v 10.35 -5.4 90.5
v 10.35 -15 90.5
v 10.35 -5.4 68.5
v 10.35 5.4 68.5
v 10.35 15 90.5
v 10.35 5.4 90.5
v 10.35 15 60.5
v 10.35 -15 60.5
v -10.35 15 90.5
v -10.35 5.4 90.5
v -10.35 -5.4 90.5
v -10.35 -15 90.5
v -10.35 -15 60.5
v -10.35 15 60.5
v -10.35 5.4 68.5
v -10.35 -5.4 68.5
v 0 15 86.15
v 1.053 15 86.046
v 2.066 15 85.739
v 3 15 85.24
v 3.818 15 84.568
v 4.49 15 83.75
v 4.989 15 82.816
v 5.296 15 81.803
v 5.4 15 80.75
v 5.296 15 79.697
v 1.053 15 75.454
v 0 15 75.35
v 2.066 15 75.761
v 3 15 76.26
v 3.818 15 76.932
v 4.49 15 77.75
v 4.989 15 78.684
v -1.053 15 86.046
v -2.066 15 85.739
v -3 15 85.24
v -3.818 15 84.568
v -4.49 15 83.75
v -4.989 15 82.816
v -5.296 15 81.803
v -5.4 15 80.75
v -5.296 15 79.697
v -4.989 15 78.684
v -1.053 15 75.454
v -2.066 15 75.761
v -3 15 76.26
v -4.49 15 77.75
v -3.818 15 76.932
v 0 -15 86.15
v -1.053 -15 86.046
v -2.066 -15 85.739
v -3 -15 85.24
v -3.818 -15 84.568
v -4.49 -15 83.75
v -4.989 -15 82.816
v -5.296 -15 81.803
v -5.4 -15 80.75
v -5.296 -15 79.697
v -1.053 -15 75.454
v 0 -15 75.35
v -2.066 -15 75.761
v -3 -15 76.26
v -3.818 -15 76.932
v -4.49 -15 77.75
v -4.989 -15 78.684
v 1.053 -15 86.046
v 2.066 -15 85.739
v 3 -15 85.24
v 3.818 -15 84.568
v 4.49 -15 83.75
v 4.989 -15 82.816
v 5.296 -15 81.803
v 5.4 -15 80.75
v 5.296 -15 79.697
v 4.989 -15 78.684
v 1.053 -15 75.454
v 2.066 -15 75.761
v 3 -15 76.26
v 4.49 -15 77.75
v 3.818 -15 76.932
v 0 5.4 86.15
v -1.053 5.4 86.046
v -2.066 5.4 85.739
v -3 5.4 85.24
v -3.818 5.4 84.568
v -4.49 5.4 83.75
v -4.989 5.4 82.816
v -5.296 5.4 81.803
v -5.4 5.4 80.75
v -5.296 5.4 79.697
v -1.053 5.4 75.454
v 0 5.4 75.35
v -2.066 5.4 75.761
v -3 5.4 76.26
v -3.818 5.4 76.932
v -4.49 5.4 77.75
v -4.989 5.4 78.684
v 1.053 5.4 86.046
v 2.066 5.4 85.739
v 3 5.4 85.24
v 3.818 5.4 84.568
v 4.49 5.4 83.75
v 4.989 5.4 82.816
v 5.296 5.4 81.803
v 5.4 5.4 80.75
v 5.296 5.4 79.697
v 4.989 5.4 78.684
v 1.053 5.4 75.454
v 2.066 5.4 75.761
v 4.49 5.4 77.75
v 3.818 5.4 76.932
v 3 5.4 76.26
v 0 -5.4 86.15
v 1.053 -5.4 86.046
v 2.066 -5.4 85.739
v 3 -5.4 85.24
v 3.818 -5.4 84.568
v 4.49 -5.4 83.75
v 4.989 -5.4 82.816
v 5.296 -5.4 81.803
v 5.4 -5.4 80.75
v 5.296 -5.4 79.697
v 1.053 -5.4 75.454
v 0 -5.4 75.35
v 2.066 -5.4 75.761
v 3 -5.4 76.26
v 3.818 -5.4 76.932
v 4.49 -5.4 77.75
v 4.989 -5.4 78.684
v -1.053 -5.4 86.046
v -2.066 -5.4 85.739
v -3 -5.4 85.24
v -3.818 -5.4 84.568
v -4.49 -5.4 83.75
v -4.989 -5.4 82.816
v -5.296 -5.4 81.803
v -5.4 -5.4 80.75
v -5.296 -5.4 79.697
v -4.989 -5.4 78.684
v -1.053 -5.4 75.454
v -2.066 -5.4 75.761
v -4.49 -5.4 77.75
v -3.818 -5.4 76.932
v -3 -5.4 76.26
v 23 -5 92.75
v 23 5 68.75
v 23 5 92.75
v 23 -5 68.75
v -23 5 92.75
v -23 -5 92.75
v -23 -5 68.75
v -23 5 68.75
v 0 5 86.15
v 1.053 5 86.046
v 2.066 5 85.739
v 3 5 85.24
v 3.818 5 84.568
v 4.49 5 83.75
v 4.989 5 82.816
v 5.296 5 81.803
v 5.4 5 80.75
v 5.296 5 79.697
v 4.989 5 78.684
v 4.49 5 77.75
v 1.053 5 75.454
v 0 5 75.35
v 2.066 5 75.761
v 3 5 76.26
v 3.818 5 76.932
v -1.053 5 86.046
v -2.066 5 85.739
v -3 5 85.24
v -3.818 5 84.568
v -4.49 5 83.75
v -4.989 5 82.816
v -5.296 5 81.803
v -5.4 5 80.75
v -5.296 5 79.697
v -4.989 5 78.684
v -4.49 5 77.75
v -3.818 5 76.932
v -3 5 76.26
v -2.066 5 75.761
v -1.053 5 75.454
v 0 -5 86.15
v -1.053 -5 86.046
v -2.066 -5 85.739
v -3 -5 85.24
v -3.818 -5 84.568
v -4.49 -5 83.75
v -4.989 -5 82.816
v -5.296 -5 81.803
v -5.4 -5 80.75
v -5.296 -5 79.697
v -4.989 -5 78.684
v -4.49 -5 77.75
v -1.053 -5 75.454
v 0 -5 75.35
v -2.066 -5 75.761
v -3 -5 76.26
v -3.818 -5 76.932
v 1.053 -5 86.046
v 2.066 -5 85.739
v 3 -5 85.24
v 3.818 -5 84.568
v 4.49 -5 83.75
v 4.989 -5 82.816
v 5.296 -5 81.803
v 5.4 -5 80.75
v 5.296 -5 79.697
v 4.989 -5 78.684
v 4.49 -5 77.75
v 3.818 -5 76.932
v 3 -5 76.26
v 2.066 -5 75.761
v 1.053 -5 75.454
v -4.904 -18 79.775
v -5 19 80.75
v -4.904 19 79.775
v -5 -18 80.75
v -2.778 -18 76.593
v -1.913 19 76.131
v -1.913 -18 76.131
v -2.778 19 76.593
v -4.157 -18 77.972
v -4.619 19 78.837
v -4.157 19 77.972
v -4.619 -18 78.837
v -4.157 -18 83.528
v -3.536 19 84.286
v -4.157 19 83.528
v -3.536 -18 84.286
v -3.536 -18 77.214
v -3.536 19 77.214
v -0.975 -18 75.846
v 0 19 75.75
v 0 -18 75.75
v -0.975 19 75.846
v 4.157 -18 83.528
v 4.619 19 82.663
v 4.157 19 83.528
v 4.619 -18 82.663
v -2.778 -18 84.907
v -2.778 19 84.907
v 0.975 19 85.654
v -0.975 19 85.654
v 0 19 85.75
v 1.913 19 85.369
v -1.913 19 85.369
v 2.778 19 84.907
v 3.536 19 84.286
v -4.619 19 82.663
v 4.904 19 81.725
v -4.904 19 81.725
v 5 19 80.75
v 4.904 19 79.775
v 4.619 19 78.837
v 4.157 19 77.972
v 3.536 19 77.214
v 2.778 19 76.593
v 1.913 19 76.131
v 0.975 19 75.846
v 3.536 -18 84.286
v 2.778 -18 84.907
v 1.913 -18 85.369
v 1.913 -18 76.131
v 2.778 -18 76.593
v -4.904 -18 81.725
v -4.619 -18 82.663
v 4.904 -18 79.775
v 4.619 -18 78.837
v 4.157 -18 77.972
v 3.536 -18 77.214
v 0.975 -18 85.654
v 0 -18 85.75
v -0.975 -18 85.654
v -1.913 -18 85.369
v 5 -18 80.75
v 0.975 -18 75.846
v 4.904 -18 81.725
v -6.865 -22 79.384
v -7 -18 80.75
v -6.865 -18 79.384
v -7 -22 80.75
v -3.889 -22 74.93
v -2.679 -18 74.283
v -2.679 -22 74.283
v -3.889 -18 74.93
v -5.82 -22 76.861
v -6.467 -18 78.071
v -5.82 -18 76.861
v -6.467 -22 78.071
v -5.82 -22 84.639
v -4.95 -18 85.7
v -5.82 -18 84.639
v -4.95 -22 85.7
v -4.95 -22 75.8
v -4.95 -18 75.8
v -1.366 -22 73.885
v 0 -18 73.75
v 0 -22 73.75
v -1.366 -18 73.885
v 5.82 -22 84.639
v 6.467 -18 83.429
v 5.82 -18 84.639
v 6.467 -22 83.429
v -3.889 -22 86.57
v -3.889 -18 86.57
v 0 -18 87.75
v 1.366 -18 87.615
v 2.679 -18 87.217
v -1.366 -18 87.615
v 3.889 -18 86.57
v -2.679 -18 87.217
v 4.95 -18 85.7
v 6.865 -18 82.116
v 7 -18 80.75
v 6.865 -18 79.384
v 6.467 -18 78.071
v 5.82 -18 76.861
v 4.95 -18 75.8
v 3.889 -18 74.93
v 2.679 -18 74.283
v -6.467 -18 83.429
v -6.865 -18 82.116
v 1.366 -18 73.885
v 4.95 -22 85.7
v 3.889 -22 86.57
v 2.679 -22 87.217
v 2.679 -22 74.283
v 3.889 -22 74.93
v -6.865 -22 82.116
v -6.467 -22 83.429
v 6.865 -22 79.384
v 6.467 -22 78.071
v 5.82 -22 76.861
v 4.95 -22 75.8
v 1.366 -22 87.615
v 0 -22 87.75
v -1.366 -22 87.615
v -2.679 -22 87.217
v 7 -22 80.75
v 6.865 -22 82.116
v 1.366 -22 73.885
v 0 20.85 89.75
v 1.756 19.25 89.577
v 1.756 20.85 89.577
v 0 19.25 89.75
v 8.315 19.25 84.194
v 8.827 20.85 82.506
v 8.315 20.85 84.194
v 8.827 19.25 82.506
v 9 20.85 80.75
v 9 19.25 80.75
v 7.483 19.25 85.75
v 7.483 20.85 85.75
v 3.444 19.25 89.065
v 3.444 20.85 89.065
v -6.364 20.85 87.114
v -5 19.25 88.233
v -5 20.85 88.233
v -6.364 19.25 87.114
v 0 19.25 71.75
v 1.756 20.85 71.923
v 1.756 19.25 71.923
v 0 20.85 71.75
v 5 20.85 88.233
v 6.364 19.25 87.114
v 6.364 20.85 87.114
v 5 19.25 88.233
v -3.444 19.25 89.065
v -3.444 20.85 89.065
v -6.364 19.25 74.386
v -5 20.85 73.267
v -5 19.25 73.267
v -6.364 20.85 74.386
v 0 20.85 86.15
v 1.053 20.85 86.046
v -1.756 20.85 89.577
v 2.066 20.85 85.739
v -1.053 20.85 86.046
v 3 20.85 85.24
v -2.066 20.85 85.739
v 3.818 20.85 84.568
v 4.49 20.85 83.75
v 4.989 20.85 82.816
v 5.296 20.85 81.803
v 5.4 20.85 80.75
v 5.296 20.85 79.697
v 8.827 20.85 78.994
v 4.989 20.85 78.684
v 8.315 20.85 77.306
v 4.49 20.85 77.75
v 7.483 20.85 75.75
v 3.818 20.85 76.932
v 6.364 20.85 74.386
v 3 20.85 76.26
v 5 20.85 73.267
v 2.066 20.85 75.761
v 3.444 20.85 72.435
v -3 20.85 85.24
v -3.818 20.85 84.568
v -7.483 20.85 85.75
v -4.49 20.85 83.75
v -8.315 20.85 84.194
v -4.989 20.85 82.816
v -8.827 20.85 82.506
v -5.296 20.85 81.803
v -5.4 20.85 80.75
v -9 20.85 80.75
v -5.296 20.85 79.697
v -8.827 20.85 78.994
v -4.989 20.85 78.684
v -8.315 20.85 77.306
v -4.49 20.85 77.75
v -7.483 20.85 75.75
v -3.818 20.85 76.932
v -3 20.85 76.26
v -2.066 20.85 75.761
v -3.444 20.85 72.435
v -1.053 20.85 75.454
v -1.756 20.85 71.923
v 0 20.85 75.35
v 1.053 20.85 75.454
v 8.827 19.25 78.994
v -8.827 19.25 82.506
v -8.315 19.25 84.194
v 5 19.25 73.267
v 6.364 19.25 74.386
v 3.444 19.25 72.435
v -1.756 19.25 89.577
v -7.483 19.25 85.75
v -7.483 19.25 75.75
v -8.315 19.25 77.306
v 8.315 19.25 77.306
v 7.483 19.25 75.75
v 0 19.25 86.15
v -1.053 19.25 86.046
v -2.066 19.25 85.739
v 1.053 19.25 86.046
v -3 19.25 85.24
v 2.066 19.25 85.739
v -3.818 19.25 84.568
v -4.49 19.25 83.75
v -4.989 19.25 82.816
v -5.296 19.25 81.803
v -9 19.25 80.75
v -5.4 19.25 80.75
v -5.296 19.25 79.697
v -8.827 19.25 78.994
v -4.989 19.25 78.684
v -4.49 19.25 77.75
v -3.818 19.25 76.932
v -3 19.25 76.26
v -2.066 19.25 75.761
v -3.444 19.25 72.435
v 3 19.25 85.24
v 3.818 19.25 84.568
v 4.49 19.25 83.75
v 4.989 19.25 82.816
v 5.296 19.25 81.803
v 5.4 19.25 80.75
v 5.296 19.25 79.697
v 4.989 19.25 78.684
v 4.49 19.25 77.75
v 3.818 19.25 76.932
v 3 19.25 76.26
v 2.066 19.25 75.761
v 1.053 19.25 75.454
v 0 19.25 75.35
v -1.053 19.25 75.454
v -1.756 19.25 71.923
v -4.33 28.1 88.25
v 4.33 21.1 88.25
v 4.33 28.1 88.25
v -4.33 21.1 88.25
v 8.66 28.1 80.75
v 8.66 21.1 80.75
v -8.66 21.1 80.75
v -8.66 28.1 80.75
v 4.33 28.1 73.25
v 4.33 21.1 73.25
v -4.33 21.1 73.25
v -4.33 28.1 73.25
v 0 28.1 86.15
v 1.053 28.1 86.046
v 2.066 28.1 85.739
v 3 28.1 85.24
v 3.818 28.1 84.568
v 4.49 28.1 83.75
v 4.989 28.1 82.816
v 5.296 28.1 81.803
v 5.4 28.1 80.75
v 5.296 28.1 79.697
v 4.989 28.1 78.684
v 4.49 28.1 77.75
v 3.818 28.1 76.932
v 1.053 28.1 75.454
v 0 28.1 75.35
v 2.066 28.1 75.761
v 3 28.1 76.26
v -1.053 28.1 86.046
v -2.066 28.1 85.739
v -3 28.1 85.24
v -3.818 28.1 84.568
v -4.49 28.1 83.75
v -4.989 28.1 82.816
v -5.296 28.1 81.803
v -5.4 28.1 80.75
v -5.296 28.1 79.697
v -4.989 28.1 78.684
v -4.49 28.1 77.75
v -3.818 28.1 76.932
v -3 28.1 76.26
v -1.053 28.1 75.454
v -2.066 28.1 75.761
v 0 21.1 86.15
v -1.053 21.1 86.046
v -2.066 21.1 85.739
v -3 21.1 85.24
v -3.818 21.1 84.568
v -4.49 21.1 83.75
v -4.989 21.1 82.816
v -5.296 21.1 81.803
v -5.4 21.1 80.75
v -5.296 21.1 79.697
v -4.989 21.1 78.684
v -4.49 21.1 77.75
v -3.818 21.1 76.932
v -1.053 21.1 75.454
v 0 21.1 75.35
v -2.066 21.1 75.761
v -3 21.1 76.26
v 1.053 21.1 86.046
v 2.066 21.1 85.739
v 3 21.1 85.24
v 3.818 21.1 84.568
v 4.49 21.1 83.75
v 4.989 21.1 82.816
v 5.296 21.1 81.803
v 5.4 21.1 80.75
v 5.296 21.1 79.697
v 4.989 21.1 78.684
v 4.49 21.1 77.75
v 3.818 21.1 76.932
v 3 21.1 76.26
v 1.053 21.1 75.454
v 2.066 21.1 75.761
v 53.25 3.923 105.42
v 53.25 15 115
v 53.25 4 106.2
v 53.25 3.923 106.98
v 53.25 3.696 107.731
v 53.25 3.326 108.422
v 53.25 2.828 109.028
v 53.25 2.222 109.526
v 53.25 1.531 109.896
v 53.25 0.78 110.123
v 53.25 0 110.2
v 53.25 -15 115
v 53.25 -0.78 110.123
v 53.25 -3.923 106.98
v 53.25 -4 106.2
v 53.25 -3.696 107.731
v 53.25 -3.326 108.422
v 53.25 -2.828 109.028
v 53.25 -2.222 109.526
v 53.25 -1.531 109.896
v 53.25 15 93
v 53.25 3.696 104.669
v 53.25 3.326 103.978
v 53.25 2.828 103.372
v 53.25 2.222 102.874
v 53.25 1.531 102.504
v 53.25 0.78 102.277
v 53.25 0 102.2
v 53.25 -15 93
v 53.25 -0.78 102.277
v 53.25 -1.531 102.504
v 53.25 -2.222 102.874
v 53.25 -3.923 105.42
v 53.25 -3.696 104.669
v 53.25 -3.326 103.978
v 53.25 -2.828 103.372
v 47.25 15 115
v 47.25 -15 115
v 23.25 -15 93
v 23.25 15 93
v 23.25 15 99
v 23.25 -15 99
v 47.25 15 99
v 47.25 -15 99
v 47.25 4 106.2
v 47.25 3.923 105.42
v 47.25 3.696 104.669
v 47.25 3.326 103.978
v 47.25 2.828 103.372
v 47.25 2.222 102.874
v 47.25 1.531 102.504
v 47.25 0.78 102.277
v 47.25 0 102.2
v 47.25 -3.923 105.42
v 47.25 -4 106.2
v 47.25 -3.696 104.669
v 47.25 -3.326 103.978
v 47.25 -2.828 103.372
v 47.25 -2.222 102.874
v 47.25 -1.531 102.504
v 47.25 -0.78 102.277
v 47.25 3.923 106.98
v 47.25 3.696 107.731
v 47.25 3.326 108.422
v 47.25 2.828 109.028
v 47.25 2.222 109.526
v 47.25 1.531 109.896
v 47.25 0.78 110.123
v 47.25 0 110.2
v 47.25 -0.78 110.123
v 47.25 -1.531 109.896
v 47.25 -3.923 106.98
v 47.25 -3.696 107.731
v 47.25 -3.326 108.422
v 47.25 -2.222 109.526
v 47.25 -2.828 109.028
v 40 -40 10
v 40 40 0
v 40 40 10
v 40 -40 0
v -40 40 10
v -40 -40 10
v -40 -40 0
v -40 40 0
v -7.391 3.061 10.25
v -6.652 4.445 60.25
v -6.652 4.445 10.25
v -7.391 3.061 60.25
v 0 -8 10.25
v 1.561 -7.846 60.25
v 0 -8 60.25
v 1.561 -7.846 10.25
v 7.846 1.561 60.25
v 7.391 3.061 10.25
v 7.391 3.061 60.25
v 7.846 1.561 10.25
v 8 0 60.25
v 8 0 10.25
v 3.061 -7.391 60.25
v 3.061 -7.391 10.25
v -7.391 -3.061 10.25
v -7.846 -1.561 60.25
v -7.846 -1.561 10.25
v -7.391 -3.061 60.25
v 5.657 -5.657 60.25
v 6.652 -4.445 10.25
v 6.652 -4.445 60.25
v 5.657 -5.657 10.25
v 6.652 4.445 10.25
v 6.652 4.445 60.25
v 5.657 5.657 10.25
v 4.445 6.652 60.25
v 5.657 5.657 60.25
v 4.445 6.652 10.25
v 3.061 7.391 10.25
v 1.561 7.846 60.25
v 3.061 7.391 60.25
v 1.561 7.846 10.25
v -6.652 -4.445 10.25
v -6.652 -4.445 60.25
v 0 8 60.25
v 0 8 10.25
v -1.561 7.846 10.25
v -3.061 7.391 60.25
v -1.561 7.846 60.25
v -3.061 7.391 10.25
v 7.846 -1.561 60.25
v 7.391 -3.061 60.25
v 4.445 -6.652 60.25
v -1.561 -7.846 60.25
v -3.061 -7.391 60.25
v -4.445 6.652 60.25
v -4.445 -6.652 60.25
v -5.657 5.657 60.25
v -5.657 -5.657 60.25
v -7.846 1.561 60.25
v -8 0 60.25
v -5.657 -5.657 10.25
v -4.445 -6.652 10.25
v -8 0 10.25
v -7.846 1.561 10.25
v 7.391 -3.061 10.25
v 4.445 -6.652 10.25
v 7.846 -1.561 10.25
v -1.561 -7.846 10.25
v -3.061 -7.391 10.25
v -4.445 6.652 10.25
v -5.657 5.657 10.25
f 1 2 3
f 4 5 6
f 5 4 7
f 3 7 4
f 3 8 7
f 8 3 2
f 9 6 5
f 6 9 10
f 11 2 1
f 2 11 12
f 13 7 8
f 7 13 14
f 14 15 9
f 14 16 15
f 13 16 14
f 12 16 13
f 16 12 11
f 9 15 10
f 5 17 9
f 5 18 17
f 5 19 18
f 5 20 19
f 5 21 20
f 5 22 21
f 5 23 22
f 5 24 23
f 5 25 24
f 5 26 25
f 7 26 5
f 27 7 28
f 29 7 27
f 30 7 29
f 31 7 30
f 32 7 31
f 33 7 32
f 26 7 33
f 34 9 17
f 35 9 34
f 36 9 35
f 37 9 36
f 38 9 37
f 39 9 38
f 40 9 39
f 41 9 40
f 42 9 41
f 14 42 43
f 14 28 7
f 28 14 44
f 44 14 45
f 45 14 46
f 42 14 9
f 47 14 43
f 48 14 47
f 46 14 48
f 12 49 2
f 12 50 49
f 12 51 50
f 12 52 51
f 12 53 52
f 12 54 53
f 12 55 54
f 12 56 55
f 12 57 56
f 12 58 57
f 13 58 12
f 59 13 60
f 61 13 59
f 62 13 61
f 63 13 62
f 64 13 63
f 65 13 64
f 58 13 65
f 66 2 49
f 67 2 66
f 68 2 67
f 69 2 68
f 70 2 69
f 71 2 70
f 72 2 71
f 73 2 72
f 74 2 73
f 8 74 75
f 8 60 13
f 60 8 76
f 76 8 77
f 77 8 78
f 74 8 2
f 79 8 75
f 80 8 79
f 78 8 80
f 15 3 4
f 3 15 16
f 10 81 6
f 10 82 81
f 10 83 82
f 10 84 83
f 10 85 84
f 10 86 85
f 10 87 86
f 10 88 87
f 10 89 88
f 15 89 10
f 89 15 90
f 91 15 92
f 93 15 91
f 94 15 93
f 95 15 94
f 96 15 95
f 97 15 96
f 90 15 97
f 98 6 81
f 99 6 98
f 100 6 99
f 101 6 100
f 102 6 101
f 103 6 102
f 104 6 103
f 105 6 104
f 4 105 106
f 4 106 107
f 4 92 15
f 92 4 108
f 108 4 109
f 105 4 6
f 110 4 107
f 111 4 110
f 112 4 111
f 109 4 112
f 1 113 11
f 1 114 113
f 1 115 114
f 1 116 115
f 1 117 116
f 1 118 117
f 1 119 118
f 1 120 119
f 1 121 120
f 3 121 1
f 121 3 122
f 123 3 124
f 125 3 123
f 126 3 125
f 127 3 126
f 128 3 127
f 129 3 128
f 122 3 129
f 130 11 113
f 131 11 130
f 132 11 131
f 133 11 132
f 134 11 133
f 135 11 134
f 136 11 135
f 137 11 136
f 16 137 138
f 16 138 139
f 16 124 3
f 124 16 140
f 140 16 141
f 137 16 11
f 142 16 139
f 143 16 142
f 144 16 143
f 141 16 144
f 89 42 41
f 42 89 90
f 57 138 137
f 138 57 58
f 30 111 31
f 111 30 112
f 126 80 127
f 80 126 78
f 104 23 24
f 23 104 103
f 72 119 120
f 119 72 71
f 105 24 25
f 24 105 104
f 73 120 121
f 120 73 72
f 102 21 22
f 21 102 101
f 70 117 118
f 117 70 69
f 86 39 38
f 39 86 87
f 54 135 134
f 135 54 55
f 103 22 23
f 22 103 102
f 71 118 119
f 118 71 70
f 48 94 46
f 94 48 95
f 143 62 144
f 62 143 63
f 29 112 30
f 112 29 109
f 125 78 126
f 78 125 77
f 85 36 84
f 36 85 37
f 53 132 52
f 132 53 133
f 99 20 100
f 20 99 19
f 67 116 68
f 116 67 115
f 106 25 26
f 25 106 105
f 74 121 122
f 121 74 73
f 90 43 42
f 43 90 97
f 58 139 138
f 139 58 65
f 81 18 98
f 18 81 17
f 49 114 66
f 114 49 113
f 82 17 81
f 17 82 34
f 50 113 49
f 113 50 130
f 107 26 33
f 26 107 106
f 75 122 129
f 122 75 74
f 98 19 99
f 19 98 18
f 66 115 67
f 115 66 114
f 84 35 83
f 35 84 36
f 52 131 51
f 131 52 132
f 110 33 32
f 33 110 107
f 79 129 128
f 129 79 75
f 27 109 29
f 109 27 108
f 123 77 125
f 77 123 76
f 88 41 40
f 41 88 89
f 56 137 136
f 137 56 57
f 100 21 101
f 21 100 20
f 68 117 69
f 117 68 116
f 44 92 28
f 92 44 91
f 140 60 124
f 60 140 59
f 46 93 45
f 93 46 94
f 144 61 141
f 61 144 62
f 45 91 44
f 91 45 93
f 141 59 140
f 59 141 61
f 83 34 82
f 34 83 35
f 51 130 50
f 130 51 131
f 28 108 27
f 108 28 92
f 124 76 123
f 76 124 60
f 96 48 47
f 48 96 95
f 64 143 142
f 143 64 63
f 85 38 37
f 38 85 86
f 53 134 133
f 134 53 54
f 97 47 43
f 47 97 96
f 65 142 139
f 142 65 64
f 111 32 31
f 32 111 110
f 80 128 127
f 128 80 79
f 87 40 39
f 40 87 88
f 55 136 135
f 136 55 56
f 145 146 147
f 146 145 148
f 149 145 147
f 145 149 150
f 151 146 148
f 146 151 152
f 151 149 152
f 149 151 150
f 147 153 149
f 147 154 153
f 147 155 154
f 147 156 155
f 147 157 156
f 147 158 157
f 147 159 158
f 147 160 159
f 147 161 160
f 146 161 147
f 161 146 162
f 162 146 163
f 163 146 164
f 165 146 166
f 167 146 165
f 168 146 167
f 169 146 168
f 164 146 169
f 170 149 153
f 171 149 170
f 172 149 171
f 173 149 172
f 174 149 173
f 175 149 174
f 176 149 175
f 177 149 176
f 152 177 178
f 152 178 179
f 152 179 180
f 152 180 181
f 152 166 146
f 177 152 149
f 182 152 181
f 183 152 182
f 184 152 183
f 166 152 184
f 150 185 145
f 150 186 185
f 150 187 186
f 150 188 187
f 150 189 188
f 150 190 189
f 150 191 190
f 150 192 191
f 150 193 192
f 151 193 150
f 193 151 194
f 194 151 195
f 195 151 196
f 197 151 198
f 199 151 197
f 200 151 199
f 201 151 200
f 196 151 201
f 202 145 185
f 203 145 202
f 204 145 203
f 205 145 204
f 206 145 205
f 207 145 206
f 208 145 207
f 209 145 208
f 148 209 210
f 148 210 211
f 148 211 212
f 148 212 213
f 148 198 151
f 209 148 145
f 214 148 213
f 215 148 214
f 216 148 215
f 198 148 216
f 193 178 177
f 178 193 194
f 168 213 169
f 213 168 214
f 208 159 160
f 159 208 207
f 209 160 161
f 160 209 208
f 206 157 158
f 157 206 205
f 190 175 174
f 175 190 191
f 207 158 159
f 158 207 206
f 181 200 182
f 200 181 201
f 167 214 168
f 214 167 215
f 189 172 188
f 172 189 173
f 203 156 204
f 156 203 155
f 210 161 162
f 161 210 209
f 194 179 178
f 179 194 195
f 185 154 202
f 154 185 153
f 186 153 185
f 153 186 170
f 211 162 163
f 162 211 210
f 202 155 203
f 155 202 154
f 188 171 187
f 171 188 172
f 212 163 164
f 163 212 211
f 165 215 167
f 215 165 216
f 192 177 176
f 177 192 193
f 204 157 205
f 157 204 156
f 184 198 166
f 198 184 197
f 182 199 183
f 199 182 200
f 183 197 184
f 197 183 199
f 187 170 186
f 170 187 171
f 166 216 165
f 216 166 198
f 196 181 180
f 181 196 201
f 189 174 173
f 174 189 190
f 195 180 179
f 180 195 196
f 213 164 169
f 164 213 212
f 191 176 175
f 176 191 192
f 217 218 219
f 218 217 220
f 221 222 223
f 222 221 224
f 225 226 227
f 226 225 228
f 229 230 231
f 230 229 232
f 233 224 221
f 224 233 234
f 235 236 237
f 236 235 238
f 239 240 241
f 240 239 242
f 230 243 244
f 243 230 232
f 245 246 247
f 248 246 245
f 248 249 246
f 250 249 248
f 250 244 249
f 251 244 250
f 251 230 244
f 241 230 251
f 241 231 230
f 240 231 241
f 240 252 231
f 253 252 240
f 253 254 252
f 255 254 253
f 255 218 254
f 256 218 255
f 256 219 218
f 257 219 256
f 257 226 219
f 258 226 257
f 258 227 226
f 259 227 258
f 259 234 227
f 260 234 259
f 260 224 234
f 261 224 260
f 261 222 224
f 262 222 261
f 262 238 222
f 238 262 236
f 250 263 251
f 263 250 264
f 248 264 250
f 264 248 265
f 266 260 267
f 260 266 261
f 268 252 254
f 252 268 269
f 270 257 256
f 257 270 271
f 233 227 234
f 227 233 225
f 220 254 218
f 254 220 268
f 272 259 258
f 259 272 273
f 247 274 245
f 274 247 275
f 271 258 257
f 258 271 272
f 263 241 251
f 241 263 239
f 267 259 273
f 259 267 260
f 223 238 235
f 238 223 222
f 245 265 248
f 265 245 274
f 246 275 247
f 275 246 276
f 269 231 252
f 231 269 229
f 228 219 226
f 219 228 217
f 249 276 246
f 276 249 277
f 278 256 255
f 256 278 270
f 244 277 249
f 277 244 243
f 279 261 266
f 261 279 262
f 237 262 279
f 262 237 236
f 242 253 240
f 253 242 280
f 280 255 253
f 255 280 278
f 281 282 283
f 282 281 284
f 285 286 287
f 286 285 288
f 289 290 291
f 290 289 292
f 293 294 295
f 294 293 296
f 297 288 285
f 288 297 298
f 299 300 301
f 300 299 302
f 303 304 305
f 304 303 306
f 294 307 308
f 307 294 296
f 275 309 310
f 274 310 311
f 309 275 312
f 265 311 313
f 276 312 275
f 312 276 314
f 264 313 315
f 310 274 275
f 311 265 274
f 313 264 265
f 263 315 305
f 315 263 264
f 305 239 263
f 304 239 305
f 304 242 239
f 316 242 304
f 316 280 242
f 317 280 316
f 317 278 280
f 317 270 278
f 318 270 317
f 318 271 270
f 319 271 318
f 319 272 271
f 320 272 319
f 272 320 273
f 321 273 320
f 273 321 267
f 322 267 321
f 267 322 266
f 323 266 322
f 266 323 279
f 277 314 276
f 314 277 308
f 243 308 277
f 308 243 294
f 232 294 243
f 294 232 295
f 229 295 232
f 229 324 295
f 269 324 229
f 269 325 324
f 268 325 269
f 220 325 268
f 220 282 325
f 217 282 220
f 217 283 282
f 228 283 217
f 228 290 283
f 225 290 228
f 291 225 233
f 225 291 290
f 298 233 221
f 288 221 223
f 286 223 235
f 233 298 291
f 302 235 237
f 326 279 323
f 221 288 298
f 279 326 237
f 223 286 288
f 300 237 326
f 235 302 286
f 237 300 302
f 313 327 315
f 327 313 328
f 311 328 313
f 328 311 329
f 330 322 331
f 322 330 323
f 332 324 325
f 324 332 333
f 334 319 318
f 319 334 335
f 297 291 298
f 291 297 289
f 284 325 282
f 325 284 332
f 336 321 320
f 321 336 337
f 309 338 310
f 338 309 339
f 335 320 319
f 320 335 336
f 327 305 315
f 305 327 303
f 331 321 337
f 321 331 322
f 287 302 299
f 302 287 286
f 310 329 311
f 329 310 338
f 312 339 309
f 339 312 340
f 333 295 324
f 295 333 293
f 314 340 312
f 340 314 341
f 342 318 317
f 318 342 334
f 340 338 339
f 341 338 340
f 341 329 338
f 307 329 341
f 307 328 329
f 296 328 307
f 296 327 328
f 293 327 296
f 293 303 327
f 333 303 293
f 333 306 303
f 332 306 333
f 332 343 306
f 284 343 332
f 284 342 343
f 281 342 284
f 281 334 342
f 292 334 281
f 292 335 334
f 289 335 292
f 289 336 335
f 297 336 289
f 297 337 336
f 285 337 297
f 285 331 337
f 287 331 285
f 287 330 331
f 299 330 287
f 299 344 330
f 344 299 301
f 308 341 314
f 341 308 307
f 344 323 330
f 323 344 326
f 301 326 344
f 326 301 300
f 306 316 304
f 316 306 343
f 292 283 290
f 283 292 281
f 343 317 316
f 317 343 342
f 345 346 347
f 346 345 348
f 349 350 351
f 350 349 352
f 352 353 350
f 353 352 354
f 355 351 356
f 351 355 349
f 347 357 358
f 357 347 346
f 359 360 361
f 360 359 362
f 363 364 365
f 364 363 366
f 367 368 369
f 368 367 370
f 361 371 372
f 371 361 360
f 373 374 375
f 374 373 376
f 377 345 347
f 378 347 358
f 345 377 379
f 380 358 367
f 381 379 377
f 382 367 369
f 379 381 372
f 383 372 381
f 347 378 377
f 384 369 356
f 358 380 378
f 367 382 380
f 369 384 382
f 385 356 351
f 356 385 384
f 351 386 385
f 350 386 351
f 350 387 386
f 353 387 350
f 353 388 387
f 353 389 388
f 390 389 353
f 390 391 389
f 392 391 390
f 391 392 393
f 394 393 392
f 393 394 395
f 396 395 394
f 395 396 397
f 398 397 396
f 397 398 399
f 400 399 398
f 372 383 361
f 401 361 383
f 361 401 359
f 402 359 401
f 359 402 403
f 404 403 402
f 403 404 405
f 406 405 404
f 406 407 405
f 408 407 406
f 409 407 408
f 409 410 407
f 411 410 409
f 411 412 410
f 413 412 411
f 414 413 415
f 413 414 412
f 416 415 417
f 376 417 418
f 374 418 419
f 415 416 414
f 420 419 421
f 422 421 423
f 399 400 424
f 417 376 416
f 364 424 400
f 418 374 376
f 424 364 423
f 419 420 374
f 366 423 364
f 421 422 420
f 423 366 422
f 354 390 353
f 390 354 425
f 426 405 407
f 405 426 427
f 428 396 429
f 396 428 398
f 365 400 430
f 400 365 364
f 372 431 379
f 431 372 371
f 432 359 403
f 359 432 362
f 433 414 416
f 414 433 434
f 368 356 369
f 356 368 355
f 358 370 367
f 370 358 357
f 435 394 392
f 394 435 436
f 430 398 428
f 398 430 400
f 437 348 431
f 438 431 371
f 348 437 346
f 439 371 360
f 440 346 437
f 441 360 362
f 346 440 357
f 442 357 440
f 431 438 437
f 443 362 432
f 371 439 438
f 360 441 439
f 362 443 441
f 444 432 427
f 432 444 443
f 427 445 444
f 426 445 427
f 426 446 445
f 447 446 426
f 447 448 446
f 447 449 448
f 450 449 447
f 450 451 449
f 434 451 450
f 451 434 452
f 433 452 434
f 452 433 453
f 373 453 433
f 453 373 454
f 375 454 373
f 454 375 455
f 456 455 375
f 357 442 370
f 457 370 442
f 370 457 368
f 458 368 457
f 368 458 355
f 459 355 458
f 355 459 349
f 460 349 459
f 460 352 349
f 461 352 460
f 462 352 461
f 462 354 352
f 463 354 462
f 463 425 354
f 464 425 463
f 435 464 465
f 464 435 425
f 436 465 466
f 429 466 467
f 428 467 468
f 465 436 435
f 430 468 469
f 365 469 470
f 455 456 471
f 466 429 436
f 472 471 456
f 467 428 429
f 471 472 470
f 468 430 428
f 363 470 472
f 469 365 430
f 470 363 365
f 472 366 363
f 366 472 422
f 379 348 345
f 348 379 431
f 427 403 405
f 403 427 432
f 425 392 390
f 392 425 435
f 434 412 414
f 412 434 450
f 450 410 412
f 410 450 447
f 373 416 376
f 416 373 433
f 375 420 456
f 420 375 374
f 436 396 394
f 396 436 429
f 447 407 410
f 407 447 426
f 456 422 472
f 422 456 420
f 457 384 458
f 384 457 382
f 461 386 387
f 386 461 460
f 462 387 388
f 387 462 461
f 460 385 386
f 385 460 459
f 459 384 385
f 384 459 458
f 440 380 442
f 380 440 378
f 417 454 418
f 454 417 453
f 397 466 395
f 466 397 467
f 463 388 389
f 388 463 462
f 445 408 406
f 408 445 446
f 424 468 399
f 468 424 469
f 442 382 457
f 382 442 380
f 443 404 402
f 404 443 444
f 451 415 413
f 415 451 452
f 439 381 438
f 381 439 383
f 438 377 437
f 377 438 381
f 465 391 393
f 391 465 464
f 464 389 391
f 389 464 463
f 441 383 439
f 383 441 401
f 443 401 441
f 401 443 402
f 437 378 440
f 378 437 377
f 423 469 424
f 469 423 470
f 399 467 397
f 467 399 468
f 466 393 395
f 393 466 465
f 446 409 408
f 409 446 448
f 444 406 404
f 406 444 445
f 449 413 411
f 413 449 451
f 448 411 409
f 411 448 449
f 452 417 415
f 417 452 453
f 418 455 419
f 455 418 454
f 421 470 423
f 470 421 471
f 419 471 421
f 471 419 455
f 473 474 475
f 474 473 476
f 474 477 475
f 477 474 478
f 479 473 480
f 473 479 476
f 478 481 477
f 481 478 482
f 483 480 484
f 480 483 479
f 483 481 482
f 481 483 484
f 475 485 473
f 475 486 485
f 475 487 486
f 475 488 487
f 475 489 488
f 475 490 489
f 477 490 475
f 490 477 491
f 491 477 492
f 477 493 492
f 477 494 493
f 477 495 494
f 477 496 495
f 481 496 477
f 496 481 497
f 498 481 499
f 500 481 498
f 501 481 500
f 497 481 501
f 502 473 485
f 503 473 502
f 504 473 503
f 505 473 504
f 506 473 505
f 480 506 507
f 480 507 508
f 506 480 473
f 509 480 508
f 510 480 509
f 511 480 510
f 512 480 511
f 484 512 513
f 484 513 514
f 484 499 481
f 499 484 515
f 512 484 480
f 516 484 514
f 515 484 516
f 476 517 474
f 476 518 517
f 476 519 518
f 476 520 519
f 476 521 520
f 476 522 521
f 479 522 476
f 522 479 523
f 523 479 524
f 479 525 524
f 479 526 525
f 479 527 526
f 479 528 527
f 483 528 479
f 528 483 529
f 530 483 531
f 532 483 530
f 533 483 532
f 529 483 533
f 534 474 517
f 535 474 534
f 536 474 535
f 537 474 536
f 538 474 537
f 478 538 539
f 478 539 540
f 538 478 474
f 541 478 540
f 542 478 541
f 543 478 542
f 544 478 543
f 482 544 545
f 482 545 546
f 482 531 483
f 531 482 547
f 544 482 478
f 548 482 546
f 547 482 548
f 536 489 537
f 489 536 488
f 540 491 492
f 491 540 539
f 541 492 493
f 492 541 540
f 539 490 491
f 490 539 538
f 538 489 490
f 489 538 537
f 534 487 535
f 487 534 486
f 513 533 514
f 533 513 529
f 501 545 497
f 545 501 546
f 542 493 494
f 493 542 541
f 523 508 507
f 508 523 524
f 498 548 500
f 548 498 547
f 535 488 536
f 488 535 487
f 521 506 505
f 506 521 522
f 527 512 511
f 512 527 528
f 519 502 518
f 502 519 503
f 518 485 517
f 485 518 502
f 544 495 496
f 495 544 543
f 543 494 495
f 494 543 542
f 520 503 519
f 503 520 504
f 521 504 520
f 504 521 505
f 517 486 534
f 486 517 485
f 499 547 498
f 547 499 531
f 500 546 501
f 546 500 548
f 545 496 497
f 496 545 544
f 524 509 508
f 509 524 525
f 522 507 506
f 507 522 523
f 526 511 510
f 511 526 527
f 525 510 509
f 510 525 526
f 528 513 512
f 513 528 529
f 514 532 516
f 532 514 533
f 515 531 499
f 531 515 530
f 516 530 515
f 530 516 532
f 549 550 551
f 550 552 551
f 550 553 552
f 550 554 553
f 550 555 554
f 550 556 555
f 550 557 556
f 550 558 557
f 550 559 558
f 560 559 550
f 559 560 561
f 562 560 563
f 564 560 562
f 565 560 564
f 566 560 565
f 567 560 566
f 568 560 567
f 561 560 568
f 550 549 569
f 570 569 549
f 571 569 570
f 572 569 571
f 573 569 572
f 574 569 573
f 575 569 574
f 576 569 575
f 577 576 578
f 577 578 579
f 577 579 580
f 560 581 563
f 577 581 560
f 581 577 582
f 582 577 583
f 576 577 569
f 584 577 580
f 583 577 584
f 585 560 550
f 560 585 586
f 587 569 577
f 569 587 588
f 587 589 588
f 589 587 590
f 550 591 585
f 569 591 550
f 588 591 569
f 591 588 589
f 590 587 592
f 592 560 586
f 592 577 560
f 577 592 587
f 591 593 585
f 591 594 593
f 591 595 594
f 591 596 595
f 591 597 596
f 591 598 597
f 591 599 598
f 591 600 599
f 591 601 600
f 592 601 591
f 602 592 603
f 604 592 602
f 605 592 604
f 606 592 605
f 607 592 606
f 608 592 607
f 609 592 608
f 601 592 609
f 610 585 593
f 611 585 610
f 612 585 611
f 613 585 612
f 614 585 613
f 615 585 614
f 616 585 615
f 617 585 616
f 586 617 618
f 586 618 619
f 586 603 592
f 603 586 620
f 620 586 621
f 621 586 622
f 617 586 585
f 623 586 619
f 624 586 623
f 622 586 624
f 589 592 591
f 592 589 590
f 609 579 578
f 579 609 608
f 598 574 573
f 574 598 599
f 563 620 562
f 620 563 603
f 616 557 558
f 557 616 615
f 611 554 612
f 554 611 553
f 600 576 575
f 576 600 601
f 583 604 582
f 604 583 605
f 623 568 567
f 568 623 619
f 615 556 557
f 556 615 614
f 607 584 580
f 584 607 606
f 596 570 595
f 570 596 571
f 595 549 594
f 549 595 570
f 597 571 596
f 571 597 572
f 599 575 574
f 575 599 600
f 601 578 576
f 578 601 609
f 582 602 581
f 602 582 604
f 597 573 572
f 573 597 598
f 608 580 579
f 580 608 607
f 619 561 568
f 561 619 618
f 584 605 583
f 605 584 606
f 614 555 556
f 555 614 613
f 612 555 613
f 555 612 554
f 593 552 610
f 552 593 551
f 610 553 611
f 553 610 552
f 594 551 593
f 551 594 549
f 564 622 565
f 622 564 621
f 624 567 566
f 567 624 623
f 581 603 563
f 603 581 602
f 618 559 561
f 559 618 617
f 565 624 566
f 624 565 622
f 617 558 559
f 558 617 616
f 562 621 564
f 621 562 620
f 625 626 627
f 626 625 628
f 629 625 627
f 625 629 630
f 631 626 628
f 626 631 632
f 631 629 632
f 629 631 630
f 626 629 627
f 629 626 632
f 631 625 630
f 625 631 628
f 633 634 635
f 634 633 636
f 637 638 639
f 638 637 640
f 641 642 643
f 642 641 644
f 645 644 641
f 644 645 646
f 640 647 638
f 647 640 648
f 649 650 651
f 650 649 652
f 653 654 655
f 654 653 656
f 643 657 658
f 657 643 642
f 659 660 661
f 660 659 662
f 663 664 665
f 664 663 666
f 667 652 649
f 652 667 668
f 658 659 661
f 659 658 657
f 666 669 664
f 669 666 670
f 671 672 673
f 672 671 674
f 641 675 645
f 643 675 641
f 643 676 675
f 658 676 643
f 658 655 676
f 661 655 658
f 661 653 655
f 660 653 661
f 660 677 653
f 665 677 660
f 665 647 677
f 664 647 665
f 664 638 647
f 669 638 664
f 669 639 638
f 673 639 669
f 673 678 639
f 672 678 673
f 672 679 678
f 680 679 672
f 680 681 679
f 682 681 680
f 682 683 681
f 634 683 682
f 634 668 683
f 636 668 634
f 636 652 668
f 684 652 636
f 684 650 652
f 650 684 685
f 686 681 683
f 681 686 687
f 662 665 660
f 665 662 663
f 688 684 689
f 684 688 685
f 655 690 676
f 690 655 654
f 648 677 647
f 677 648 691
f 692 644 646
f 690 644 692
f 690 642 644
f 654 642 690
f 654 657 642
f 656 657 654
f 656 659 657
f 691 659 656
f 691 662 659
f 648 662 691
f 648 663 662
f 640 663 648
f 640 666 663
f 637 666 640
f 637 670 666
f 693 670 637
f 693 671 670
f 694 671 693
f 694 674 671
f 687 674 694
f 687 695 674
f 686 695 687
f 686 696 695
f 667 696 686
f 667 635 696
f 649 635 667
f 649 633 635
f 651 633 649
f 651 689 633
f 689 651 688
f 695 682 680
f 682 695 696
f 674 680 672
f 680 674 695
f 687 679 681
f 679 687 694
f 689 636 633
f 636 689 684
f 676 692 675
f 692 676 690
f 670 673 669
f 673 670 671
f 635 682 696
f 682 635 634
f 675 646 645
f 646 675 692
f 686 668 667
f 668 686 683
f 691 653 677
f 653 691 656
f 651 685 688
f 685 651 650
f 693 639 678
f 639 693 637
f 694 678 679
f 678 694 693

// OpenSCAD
$fn = 32;

// ------------------------------------------------------------------------
// Lamp arm: column d16 x 50 mm, arm 46 mm
// Every part is its own module, assembly() places every instance.
// ------------------------------------------------------------------------

// --- part 1 ---
module lamp_base() {
  difference() {
    translate([-40, -40, 0]) cube([80, 80, 10]);
  }
}

// --- part 2 ---
module lamp_column() {
  cylinder(h = 50, d = 16);
}

// --- part 3 ---
module head_fork() {
  difference() {
    translate([-10.35, -15, 0]) cube([20.7, 30, 30]);
    translate([-11.35, -5.4, 8]) cube([22.7, 10.8, 23]);
    translate([0, 0, 20.25]) rotate([90, 0, 0]) cylinder(h = 32, d = 10.8, center = true);
  }
}

// --- part 4 ---
module lamp_arm() {
  difference() {
    translate([-23, -5, 0]) cube([46, 10, 24]);
    translate([0, 0, 12]) rotate([90, 0, 0]) cylinder(h = 12, d = 10.8, center = true);
  }
}

// --- part 5 ---
module arm_pin() {
  rotate([0, 90, 0]) cylinder(h = 38, d = 10, center = true);
  translate([-22, 0, 0]) rotate([0, 90, 0]) cylinder(h = 4, d = 14);
}

// --- part 6 ---
module arm_washer() {
  difference() {
      translate([0, 0, 0]) cylinder(h = 1.6, d = 18);
      translate([0, 0, -1]) cylinder(h = 3.6, d = 10.8);
    }
}

// --- part 7 ---
module arm_nut() {
  difference() {
    linear_extrude(height = 7) polygon(points = [[8.66, 0], [4.33, 7.5], [-4.33, 7.5], [-8.66, 0], [-4.33, -7.5], [4.33, -7.5]]);
    translate([0, 0, -1]) cylinder(h = 9, d = 10.8);
  }
}

// --- part 8 ---
module shade_bracket() {
  difference() {
    translate([-15, -15, 0]) cube([30, 30, 22]);
    translate([-16, -16, 6]) cube([25, 32, 17]);
    translate([12, 0, 13.2]) rotate([0, 90, 0]) cylinder(h = 8, d = 8, center = true);
  }
}

// --- assembly ---
module assembly() {
  color([0.80, 0.24, 0.20]) translate([0, 0, 0]) rotate([0, 0, 0]) lamp_base();
  color([0.20, 0.45, 0.75]) translate([0, 0, 10.25]) rotate([0, 0, 0]) lamp_column();
  color([0.25, 0.62, 0.32]) translate([0, 0, 60.5]) rotate([0, 0, 0]) head_fork();
  color([0.92, 0.70, 0.18]) translate([0, 0, 68.75]) rotate([0, 0, 0]) lamp_arm();
  color([0.58, 0.35, 0.70]) translate([0, 0, 80.75]) rotate([0, 0, 90]) arm_pin();
  color([0.16, 0.66, 0.66]) translate([0, 20.85, 80.75]) rotate([90, 0, 0]) arm_washer();
  color([0.85, 0.48, 0.18]) translate([0, 28.1, 80.75]) rotate([90, 0, 0]) arm_nut();
  color([0.55, 0.60, 0.65]) translate([38.25, 0, 93]) rotate([0, 0, 0]) shade_bracket();
}

assembly();
